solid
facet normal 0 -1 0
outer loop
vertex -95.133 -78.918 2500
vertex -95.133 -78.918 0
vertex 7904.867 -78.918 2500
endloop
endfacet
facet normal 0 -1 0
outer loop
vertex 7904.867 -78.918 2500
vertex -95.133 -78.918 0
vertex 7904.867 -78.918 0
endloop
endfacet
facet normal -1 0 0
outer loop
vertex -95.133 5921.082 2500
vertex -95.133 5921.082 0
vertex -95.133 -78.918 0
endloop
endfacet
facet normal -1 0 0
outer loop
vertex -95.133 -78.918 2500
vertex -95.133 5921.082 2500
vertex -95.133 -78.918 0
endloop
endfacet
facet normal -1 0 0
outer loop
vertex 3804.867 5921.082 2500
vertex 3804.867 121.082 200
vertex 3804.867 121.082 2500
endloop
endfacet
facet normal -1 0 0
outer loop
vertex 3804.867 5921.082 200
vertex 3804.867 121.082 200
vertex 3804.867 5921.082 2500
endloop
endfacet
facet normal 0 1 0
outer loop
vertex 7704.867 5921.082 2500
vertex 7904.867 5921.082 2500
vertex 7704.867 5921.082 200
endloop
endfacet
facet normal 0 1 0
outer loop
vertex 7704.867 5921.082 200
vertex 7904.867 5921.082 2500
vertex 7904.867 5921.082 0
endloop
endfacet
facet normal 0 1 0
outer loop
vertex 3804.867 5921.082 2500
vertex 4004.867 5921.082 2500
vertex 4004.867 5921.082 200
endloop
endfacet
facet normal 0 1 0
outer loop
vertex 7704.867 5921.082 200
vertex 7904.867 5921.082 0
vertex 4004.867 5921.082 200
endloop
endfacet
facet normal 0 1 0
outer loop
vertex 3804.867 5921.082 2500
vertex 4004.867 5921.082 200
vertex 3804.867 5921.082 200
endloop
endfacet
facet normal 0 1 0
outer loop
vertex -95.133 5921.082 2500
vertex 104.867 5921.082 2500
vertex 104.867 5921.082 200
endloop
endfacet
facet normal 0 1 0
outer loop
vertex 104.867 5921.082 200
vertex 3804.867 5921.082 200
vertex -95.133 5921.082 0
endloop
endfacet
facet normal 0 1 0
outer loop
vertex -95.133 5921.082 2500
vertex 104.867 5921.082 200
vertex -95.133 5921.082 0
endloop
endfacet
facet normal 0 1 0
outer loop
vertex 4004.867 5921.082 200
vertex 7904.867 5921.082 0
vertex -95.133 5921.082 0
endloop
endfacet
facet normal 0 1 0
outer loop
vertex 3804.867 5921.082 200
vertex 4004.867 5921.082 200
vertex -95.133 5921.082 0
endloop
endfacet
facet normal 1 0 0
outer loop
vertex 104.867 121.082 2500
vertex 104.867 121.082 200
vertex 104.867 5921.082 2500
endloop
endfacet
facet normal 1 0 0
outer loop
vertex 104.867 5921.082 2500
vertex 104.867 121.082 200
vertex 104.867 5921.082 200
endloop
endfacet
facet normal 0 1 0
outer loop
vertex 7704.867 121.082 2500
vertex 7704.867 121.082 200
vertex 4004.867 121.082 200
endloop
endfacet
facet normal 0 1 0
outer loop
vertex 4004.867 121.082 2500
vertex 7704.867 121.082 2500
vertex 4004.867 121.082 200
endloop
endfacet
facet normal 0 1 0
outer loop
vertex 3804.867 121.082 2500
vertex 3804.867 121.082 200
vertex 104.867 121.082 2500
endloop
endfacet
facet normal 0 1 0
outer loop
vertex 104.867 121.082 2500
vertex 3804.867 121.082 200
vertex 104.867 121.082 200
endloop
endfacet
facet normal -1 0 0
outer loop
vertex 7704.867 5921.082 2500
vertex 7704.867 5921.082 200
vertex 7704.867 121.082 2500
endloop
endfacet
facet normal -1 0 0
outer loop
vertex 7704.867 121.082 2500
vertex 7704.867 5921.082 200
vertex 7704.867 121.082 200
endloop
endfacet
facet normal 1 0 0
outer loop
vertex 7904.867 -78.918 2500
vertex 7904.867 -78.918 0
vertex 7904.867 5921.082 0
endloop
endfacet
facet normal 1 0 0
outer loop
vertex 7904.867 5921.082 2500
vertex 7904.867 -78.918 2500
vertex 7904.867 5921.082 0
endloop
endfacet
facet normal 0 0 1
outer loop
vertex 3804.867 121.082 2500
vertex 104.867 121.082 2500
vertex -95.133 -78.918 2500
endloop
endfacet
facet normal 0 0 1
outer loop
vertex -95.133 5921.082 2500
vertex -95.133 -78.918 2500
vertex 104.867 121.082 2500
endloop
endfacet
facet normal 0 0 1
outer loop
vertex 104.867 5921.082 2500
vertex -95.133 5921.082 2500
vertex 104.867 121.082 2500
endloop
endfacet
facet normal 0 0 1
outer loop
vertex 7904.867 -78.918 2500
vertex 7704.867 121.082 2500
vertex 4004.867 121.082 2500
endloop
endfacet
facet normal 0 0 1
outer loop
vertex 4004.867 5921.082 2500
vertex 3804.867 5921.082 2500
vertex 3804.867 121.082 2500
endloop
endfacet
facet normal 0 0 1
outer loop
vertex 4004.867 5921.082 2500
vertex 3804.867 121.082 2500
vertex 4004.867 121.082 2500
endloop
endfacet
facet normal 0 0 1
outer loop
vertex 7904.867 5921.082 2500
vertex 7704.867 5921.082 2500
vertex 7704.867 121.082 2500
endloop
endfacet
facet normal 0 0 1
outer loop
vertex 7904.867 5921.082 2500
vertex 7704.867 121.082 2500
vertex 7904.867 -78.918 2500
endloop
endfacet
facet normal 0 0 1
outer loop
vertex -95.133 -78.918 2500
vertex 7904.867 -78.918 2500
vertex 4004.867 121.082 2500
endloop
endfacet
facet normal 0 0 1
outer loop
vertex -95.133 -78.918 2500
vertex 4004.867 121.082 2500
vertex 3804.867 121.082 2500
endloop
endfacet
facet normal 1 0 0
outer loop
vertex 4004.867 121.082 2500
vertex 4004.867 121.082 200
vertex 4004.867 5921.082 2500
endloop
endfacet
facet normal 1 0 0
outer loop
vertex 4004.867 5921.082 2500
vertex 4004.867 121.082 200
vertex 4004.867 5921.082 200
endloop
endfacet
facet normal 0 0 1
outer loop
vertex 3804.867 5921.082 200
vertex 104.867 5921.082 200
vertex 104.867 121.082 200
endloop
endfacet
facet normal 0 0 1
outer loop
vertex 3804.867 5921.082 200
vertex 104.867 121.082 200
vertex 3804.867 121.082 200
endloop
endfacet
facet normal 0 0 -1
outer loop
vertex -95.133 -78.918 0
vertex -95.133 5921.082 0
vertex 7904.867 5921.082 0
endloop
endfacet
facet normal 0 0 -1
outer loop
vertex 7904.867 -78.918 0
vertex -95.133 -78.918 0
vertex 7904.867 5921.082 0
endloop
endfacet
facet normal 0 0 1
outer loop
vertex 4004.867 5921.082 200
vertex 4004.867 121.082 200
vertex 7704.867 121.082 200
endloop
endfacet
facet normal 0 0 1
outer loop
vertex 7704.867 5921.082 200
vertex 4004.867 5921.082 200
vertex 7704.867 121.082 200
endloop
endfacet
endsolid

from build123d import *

# Parameters (mm, degrees)
F0_W     = 200
F0_H     = 5800
F1_DEPTH = 2500
F0_W_2   = 3700
F2_DEPTH = 200


with BuildPart() as f1:
    # F0 (on Top) → F1 (new body)
    with BuildSketch(Plane.XY):
        with Locations((3904.866975, 3021.082016)):
            Rectangle(F0_W, F0_H)
        Polygon((3804.866975, 121.082016), (104.866975, 121.082016), (104.866975, -78.917984), (7704.866975, -78.917984), (7704.866975, 0), (7704.866975, 121.082016), (4004.866975, 121.082016), align=None)
        Polygon((7704.866975, 0), (7704.866975, -78.917984), (7904.866975, -78.917984), (7904.866975, 5921.082016), (7704.866975, 5921.082016), (7704.866975, 121.082016), align=None)
        Polygon((104.866975, 5921.082016), (-95.133025, 5921.082016), (-95.133025, -78.917984), (104.866975, -78.917984), (104.866975, 121.082016), align=None)
    extrude(amount=F1_DEPTH)

    # F0 (on Top) → F2 (join)
    with BuildSketch(Plane.XY):
        Polygon((104.866975, 5921.082016), (-95.133025, 5921.082016), (-95.133025, -78.917984), (104.866975, -78.917984), (104.866975, 121.082016), align=None)
        with Locations((1954.866975, 3021.082016)):
            Rectangle(F0_W_2, F0_H)
        with Locations((3904.866975, 3021.082016)):
            Rectangle(F0_W, F0_H)
        Polygon((3804.866975, 121.082016), (104.866975, 121.082016), (104.866975, -78.917984), (7704.866975, -78.917984), (7704.866975, 0), (7704.866975, 121.082016), (4004.866975, 121.082016), align=None)
        with Locations((5854.866975, 3021.082016)):
            Rectangle(F0_W_2, F0_H)
        Polygon((7704.866975, 0), (7704.866975, -78.917984), (7904.866975, -78.917984), (7904.866975, 5921.082016), (7704.866975, 5921.082016), (7704.866975, 121.082016), align=None)
    extrude(amount=F2_DEPTH)


solid = f1.part
